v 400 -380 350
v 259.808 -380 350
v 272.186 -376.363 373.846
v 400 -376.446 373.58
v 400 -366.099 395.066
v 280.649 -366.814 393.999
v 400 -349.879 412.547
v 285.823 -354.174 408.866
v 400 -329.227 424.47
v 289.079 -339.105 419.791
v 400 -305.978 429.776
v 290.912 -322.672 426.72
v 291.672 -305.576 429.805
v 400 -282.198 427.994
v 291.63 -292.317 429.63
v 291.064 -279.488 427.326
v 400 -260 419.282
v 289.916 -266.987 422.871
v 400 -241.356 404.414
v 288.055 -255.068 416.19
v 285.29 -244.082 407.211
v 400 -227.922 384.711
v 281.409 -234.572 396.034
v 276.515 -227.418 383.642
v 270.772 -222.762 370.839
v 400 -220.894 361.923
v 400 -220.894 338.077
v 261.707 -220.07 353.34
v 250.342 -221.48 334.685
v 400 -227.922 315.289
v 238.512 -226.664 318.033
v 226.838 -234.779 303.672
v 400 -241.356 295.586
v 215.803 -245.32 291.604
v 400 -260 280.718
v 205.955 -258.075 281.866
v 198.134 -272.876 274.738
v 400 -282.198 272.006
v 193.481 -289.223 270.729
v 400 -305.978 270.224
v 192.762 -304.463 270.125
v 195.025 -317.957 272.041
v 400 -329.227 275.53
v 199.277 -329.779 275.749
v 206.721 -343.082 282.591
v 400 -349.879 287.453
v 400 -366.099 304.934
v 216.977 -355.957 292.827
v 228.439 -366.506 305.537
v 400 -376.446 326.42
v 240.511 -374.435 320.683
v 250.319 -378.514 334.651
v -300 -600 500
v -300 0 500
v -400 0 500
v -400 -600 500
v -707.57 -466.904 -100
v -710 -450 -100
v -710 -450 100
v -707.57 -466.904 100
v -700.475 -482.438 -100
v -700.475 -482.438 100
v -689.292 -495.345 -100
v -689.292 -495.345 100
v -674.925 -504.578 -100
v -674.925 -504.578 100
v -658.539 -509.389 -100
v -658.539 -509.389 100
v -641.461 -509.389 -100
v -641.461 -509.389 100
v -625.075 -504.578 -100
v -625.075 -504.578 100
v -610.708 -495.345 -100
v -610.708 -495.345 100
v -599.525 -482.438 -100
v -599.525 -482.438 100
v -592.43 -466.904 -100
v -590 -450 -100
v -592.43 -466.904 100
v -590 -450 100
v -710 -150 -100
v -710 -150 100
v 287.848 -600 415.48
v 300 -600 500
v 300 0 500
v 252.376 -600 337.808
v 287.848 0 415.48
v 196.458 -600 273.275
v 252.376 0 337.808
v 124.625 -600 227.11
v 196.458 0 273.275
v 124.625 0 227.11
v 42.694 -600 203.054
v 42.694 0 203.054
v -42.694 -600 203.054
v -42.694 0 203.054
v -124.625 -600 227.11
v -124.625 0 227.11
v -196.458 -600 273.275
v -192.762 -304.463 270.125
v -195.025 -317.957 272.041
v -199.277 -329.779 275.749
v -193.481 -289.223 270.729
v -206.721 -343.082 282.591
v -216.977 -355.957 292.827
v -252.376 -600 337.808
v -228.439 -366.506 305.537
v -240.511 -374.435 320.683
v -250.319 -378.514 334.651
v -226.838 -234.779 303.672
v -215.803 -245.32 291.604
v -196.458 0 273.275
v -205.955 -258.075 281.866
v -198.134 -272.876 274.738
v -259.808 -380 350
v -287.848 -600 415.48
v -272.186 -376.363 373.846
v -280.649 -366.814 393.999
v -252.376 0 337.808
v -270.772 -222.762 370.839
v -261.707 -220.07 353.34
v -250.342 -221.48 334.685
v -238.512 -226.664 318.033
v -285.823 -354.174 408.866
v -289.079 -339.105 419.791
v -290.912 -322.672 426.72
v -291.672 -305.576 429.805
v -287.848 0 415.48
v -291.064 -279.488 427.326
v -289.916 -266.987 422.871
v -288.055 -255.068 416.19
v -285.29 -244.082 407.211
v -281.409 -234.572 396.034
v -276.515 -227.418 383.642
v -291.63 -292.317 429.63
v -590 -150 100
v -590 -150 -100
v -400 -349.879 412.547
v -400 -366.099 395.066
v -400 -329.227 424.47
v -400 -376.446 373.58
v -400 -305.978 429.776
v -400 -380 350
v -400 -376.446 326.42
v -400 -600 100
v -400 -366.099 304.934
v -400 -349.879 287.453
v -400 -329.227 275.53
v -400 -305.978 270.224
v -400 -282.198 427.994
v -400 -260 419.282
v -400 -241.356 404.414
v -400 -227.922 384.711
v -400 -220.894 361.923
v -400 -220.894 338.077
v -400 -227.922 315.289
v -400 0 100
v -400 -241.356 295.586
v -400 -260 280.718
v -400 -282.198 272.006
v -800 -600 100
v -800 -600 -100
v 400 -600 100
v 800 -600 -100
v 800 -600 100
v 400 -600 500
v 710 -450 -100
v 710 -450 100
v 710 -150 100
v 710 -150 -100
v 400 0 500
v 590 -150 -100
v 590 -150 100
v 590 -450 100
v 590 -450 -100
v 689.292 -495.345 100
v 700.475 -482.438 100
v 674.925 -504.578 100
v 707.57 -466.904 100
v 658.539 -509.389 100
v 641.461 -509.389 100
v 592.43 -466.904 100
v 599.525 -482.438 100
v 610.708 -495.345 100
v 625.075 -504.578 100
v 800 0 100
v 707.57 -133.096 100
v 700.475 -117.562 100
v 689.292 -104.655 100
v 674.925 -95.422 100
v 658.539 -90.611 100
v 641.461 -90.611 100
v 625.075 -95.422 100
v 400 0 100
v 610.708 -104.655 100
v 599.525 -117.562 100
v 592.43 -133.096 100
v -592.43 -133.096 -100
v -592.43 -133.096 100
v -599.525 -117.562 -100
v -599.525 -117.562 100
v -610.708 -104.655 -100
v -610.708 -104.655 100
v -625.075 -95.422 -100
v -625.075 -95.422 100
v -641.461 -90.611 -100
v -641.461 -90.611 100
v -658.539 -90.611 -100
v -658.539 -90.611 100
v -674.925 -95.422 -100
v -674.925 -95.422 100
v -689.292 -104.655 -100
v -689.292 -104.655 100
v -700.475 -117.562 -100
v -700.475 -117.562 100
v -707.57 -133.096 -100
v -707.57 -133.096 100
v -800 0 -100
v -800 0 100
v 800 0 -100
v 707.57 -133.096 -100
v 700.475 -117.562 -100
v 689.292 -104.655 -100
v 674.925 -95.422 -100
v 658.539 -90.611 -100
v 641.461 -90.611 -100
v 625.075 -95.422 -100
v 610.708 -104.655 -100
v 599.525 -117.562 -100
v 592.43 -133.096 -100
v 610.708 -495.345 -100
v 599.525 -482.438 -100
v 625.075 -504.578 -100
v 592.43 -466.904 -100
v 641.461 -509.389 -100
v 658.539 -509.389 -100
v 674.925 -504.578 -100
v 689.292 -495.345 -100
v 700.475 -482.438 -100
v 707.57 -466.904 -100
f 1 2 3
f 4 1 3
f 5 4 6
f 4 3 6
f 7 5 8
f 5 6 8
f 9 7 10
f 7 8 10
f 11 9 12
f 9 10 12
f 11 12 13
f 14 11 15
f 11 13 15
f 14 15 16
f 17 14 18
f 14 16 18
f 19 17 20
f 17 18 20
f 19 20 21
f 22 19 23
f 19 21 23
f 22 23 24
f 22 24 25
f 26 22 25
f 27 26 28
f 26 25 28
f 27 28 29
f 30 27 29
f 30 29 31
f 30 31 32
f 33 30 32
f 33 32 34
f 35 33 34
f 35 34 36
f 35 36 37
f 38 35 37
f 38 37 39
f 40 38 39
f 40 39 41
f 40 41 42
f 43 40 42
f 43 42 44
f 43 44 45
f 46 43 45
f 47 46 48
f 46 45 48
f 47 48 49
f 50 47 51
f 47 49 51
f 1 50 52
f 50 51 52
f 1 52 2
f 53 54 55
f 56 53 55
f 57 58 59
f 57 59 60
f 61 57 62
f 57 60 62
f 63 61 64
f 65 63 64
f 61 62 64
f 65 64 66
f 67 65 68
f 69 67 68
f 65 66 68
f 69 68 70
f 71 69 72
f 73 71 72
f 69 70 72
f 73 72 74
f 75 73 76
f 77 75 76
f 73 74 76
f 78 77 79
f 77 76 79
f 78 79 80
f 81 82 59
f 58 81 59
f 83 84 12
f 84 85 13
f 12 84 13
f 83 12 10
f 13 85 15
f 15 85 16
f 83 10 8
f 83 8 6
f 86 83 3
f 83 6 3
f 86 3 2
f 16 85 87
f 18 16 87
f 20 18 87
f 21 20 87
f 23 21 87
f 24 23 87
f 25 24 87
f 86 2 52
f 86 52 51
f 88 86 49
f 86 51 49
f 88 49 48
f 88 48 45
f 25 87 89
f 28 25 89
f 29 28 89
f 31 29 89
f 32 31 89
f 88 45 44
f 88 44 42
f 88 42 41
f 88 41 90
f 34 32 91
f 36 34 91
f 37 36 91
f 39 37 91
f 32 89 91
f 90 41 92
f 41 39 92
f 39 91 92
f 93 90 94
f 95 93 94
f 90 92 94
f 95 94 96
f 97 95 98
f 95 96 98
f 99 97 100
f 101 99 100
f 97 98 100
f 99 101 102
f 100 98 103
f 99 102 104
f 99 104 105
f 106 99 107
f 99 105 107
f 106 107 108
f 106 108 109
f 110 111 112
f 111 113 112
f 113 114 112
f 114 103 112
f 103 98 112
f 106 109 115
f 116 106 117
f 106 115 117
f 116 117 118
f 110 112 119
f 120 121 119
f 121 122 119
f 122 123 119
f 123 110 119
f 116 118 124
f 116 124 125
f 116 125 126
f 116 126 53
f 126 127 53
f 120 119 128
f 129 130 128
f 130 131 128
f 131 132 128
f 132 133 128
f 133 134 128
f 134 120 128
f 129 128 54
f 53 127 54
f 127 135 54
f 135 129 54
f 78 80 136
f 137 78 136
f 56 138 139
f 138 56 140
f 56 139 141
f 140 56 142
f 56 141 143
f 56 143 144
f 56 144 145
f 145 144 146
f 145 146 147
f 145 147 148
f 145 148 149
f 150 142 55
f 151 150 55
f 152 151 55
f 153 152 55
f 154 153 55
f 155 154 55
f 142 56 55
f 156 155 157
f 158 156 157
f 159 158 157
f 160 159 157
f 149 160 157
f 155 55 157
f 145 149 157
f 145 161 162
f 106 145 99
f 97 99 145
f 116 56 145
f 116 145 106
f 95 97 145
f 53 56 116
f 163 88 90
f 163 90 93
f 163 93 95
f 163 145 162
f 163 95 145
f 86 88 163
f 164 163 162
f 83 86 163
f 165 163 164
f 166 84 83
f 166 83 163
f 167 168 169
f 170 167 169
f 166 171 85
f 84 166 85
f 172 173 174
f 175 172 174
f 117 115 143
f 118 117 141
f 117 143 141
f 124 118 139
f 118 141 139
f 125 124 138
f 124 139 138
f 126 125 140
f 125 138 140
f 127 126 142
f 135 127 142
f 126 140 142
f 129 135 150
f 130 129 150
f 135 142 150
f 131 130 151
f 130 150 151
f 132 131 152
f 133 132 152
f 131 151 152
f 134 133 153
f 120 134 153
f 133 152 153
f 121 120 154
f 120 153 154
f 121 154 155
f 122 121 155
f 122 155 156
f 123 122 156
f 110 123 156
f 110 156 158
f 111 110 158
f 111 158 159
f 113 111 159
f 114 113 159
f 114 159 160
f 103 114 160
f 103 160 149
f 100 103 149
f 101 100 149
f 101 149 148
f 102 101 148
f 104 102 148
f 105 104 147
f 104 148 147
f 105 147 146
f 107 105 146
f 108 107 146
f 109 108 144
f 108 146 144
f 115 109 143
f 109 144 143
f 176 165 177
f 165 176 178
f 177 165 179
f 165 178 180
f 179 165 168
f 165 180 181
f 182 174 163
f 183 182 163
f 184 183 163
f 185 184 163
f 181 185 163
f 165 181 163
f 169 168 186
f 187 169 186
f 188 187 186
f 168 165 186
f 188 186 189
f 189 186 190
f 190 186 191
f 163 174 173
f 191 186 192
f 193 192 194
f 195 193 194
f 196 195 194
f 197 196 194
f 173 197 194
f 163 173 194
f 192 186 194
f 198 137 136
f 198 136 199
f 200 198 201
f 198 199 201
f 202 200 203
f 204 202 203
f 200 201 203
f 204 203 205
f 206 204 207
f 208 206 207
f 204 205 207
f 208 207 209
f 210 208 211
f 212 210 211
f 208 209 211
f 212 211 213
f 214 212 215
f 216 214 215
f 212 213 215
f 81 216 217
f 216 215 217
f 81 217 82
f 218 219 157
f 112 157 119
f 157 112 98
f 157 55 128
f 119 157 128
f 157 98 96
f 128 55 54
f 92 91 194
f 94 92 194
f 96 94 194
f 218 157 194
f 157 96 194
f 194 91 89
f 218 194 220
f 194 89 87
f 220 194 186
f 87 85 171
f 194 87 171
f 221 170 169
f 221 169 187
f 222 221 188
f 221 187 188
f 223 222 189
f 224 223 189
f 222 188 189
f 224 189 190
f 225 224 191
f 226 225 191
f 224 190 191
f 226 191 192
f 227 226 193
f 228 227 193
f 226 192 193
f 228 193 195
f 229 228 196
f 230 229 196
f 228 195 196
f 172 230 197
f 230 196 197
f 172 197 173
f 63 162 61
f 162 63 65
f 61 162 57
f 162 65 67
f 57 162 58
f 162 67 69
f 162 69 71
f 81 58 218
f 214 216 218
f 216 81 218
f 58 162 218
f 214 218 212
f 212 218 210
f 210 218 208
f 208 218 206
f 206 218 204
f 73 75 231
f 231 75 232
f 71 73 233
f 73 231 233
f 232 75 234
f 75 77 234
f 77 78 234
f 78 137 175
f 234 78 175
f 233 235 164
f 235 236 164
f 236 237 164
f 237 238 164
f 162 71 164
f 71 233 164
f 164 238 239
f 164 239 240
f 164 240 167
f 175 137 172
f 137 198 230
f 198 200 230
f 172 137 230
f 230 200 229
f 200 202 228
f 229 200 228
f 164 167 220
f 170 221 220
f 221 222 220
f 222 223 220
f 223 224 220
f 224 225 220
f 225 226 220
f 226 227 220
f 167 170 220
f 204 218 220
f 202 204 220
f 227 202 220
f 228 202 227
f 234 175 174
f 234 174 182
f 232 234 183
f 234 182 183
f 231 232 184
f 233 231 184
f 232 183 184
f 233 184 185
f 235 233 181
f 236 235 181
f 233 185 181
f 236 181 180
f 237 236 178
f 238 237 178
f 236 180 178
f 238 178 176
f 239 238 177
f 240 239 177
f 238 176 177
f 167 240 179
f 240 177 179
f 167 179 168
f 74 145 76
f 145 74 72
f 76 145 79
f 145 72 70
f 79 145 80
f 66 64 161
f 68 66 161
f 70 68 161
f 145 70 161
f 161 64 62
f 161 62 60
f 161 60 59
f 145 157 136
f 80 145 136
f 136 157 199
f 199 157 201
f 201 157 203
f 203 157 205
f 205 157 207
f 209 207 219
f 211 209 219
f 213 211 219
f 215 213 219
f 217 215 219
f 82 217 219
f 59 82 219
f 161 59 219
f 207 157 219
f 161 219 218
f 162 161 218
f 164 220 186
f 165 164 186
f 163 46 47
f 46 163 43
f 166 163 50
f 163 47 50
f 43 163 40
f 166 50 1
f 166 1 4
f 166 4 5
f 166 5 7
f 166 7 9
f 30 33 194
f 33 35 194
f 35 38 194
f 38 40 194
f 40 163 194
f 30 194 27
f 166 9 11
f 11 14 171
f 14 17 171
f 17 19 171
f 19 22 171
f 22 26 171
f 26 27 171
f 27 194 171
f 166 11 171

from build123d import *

# Parameters (mm, degrees)
F1_DEPTH = 600
F2_R     = 80
F3_DEPTH = 1200.001
F5_DEPTH = 200.001


with BuildPart() as f1:
    # F0 (on Front) → F1 (new body)
    with BuildSketch(Plane.XZ):
        with BuildLine():
            Line((-800, 100), (-800, -100))
            Line((-800, -100), (800, -100))
            Line((800, -100), (800, 100))
            Line((800, 100), (400, 100))
            Line((400, 100), (400, 500))
            Line((400, 500), (300, 500))
            ThreePointArc((300, 500), (0, 200), (-300, 500))
            Line((-300, 500), (-400, 500))
            Line((-400, 500), (-400, 100))
            Line((-400, 100), (-800, 100))
        make_face()
    extrude(amount=F1_DEPTH)

    # F2 (on face) → F3 (cut, through all)
    with BuildSketch(Plane(origin=(-400, 0, 0), x_dir=(0, -1, 0), z_dir=(-1, 0, 0))):
        with Locations((300, 350)):
            Circle(F2_R)
    extrude(amount=-F3_DEPTH, mode=Mode.SUBTRACT)

    # F4 (on face) → F5 (cut, through all)
    with BuildSketch(Plane.XY.offset(100)):
        with BuildLine():
            ThreePointArc((590, -450), (650, -510), (710, -450))
            Line((710, -450), (710, -150))
            ThreePointArc((710, -150), (650, -90), (590, -150))
            Line((590, -150), (590, -450))
        make_face()
        with BuildLine():
            Line((-710, -150), (-710, -450))
            ThreePointArc((-710, -450), (-650, -510), (-590, -450))
            Line((-590, -450), (-590, -150))
            ThreePointArc((-590, -150), (-650, -90), (-710, -150))
        make_face()
    extrude(amount=-F5_DEPTH, mode=Mode.SUBTRACT)


solid = f1.part
